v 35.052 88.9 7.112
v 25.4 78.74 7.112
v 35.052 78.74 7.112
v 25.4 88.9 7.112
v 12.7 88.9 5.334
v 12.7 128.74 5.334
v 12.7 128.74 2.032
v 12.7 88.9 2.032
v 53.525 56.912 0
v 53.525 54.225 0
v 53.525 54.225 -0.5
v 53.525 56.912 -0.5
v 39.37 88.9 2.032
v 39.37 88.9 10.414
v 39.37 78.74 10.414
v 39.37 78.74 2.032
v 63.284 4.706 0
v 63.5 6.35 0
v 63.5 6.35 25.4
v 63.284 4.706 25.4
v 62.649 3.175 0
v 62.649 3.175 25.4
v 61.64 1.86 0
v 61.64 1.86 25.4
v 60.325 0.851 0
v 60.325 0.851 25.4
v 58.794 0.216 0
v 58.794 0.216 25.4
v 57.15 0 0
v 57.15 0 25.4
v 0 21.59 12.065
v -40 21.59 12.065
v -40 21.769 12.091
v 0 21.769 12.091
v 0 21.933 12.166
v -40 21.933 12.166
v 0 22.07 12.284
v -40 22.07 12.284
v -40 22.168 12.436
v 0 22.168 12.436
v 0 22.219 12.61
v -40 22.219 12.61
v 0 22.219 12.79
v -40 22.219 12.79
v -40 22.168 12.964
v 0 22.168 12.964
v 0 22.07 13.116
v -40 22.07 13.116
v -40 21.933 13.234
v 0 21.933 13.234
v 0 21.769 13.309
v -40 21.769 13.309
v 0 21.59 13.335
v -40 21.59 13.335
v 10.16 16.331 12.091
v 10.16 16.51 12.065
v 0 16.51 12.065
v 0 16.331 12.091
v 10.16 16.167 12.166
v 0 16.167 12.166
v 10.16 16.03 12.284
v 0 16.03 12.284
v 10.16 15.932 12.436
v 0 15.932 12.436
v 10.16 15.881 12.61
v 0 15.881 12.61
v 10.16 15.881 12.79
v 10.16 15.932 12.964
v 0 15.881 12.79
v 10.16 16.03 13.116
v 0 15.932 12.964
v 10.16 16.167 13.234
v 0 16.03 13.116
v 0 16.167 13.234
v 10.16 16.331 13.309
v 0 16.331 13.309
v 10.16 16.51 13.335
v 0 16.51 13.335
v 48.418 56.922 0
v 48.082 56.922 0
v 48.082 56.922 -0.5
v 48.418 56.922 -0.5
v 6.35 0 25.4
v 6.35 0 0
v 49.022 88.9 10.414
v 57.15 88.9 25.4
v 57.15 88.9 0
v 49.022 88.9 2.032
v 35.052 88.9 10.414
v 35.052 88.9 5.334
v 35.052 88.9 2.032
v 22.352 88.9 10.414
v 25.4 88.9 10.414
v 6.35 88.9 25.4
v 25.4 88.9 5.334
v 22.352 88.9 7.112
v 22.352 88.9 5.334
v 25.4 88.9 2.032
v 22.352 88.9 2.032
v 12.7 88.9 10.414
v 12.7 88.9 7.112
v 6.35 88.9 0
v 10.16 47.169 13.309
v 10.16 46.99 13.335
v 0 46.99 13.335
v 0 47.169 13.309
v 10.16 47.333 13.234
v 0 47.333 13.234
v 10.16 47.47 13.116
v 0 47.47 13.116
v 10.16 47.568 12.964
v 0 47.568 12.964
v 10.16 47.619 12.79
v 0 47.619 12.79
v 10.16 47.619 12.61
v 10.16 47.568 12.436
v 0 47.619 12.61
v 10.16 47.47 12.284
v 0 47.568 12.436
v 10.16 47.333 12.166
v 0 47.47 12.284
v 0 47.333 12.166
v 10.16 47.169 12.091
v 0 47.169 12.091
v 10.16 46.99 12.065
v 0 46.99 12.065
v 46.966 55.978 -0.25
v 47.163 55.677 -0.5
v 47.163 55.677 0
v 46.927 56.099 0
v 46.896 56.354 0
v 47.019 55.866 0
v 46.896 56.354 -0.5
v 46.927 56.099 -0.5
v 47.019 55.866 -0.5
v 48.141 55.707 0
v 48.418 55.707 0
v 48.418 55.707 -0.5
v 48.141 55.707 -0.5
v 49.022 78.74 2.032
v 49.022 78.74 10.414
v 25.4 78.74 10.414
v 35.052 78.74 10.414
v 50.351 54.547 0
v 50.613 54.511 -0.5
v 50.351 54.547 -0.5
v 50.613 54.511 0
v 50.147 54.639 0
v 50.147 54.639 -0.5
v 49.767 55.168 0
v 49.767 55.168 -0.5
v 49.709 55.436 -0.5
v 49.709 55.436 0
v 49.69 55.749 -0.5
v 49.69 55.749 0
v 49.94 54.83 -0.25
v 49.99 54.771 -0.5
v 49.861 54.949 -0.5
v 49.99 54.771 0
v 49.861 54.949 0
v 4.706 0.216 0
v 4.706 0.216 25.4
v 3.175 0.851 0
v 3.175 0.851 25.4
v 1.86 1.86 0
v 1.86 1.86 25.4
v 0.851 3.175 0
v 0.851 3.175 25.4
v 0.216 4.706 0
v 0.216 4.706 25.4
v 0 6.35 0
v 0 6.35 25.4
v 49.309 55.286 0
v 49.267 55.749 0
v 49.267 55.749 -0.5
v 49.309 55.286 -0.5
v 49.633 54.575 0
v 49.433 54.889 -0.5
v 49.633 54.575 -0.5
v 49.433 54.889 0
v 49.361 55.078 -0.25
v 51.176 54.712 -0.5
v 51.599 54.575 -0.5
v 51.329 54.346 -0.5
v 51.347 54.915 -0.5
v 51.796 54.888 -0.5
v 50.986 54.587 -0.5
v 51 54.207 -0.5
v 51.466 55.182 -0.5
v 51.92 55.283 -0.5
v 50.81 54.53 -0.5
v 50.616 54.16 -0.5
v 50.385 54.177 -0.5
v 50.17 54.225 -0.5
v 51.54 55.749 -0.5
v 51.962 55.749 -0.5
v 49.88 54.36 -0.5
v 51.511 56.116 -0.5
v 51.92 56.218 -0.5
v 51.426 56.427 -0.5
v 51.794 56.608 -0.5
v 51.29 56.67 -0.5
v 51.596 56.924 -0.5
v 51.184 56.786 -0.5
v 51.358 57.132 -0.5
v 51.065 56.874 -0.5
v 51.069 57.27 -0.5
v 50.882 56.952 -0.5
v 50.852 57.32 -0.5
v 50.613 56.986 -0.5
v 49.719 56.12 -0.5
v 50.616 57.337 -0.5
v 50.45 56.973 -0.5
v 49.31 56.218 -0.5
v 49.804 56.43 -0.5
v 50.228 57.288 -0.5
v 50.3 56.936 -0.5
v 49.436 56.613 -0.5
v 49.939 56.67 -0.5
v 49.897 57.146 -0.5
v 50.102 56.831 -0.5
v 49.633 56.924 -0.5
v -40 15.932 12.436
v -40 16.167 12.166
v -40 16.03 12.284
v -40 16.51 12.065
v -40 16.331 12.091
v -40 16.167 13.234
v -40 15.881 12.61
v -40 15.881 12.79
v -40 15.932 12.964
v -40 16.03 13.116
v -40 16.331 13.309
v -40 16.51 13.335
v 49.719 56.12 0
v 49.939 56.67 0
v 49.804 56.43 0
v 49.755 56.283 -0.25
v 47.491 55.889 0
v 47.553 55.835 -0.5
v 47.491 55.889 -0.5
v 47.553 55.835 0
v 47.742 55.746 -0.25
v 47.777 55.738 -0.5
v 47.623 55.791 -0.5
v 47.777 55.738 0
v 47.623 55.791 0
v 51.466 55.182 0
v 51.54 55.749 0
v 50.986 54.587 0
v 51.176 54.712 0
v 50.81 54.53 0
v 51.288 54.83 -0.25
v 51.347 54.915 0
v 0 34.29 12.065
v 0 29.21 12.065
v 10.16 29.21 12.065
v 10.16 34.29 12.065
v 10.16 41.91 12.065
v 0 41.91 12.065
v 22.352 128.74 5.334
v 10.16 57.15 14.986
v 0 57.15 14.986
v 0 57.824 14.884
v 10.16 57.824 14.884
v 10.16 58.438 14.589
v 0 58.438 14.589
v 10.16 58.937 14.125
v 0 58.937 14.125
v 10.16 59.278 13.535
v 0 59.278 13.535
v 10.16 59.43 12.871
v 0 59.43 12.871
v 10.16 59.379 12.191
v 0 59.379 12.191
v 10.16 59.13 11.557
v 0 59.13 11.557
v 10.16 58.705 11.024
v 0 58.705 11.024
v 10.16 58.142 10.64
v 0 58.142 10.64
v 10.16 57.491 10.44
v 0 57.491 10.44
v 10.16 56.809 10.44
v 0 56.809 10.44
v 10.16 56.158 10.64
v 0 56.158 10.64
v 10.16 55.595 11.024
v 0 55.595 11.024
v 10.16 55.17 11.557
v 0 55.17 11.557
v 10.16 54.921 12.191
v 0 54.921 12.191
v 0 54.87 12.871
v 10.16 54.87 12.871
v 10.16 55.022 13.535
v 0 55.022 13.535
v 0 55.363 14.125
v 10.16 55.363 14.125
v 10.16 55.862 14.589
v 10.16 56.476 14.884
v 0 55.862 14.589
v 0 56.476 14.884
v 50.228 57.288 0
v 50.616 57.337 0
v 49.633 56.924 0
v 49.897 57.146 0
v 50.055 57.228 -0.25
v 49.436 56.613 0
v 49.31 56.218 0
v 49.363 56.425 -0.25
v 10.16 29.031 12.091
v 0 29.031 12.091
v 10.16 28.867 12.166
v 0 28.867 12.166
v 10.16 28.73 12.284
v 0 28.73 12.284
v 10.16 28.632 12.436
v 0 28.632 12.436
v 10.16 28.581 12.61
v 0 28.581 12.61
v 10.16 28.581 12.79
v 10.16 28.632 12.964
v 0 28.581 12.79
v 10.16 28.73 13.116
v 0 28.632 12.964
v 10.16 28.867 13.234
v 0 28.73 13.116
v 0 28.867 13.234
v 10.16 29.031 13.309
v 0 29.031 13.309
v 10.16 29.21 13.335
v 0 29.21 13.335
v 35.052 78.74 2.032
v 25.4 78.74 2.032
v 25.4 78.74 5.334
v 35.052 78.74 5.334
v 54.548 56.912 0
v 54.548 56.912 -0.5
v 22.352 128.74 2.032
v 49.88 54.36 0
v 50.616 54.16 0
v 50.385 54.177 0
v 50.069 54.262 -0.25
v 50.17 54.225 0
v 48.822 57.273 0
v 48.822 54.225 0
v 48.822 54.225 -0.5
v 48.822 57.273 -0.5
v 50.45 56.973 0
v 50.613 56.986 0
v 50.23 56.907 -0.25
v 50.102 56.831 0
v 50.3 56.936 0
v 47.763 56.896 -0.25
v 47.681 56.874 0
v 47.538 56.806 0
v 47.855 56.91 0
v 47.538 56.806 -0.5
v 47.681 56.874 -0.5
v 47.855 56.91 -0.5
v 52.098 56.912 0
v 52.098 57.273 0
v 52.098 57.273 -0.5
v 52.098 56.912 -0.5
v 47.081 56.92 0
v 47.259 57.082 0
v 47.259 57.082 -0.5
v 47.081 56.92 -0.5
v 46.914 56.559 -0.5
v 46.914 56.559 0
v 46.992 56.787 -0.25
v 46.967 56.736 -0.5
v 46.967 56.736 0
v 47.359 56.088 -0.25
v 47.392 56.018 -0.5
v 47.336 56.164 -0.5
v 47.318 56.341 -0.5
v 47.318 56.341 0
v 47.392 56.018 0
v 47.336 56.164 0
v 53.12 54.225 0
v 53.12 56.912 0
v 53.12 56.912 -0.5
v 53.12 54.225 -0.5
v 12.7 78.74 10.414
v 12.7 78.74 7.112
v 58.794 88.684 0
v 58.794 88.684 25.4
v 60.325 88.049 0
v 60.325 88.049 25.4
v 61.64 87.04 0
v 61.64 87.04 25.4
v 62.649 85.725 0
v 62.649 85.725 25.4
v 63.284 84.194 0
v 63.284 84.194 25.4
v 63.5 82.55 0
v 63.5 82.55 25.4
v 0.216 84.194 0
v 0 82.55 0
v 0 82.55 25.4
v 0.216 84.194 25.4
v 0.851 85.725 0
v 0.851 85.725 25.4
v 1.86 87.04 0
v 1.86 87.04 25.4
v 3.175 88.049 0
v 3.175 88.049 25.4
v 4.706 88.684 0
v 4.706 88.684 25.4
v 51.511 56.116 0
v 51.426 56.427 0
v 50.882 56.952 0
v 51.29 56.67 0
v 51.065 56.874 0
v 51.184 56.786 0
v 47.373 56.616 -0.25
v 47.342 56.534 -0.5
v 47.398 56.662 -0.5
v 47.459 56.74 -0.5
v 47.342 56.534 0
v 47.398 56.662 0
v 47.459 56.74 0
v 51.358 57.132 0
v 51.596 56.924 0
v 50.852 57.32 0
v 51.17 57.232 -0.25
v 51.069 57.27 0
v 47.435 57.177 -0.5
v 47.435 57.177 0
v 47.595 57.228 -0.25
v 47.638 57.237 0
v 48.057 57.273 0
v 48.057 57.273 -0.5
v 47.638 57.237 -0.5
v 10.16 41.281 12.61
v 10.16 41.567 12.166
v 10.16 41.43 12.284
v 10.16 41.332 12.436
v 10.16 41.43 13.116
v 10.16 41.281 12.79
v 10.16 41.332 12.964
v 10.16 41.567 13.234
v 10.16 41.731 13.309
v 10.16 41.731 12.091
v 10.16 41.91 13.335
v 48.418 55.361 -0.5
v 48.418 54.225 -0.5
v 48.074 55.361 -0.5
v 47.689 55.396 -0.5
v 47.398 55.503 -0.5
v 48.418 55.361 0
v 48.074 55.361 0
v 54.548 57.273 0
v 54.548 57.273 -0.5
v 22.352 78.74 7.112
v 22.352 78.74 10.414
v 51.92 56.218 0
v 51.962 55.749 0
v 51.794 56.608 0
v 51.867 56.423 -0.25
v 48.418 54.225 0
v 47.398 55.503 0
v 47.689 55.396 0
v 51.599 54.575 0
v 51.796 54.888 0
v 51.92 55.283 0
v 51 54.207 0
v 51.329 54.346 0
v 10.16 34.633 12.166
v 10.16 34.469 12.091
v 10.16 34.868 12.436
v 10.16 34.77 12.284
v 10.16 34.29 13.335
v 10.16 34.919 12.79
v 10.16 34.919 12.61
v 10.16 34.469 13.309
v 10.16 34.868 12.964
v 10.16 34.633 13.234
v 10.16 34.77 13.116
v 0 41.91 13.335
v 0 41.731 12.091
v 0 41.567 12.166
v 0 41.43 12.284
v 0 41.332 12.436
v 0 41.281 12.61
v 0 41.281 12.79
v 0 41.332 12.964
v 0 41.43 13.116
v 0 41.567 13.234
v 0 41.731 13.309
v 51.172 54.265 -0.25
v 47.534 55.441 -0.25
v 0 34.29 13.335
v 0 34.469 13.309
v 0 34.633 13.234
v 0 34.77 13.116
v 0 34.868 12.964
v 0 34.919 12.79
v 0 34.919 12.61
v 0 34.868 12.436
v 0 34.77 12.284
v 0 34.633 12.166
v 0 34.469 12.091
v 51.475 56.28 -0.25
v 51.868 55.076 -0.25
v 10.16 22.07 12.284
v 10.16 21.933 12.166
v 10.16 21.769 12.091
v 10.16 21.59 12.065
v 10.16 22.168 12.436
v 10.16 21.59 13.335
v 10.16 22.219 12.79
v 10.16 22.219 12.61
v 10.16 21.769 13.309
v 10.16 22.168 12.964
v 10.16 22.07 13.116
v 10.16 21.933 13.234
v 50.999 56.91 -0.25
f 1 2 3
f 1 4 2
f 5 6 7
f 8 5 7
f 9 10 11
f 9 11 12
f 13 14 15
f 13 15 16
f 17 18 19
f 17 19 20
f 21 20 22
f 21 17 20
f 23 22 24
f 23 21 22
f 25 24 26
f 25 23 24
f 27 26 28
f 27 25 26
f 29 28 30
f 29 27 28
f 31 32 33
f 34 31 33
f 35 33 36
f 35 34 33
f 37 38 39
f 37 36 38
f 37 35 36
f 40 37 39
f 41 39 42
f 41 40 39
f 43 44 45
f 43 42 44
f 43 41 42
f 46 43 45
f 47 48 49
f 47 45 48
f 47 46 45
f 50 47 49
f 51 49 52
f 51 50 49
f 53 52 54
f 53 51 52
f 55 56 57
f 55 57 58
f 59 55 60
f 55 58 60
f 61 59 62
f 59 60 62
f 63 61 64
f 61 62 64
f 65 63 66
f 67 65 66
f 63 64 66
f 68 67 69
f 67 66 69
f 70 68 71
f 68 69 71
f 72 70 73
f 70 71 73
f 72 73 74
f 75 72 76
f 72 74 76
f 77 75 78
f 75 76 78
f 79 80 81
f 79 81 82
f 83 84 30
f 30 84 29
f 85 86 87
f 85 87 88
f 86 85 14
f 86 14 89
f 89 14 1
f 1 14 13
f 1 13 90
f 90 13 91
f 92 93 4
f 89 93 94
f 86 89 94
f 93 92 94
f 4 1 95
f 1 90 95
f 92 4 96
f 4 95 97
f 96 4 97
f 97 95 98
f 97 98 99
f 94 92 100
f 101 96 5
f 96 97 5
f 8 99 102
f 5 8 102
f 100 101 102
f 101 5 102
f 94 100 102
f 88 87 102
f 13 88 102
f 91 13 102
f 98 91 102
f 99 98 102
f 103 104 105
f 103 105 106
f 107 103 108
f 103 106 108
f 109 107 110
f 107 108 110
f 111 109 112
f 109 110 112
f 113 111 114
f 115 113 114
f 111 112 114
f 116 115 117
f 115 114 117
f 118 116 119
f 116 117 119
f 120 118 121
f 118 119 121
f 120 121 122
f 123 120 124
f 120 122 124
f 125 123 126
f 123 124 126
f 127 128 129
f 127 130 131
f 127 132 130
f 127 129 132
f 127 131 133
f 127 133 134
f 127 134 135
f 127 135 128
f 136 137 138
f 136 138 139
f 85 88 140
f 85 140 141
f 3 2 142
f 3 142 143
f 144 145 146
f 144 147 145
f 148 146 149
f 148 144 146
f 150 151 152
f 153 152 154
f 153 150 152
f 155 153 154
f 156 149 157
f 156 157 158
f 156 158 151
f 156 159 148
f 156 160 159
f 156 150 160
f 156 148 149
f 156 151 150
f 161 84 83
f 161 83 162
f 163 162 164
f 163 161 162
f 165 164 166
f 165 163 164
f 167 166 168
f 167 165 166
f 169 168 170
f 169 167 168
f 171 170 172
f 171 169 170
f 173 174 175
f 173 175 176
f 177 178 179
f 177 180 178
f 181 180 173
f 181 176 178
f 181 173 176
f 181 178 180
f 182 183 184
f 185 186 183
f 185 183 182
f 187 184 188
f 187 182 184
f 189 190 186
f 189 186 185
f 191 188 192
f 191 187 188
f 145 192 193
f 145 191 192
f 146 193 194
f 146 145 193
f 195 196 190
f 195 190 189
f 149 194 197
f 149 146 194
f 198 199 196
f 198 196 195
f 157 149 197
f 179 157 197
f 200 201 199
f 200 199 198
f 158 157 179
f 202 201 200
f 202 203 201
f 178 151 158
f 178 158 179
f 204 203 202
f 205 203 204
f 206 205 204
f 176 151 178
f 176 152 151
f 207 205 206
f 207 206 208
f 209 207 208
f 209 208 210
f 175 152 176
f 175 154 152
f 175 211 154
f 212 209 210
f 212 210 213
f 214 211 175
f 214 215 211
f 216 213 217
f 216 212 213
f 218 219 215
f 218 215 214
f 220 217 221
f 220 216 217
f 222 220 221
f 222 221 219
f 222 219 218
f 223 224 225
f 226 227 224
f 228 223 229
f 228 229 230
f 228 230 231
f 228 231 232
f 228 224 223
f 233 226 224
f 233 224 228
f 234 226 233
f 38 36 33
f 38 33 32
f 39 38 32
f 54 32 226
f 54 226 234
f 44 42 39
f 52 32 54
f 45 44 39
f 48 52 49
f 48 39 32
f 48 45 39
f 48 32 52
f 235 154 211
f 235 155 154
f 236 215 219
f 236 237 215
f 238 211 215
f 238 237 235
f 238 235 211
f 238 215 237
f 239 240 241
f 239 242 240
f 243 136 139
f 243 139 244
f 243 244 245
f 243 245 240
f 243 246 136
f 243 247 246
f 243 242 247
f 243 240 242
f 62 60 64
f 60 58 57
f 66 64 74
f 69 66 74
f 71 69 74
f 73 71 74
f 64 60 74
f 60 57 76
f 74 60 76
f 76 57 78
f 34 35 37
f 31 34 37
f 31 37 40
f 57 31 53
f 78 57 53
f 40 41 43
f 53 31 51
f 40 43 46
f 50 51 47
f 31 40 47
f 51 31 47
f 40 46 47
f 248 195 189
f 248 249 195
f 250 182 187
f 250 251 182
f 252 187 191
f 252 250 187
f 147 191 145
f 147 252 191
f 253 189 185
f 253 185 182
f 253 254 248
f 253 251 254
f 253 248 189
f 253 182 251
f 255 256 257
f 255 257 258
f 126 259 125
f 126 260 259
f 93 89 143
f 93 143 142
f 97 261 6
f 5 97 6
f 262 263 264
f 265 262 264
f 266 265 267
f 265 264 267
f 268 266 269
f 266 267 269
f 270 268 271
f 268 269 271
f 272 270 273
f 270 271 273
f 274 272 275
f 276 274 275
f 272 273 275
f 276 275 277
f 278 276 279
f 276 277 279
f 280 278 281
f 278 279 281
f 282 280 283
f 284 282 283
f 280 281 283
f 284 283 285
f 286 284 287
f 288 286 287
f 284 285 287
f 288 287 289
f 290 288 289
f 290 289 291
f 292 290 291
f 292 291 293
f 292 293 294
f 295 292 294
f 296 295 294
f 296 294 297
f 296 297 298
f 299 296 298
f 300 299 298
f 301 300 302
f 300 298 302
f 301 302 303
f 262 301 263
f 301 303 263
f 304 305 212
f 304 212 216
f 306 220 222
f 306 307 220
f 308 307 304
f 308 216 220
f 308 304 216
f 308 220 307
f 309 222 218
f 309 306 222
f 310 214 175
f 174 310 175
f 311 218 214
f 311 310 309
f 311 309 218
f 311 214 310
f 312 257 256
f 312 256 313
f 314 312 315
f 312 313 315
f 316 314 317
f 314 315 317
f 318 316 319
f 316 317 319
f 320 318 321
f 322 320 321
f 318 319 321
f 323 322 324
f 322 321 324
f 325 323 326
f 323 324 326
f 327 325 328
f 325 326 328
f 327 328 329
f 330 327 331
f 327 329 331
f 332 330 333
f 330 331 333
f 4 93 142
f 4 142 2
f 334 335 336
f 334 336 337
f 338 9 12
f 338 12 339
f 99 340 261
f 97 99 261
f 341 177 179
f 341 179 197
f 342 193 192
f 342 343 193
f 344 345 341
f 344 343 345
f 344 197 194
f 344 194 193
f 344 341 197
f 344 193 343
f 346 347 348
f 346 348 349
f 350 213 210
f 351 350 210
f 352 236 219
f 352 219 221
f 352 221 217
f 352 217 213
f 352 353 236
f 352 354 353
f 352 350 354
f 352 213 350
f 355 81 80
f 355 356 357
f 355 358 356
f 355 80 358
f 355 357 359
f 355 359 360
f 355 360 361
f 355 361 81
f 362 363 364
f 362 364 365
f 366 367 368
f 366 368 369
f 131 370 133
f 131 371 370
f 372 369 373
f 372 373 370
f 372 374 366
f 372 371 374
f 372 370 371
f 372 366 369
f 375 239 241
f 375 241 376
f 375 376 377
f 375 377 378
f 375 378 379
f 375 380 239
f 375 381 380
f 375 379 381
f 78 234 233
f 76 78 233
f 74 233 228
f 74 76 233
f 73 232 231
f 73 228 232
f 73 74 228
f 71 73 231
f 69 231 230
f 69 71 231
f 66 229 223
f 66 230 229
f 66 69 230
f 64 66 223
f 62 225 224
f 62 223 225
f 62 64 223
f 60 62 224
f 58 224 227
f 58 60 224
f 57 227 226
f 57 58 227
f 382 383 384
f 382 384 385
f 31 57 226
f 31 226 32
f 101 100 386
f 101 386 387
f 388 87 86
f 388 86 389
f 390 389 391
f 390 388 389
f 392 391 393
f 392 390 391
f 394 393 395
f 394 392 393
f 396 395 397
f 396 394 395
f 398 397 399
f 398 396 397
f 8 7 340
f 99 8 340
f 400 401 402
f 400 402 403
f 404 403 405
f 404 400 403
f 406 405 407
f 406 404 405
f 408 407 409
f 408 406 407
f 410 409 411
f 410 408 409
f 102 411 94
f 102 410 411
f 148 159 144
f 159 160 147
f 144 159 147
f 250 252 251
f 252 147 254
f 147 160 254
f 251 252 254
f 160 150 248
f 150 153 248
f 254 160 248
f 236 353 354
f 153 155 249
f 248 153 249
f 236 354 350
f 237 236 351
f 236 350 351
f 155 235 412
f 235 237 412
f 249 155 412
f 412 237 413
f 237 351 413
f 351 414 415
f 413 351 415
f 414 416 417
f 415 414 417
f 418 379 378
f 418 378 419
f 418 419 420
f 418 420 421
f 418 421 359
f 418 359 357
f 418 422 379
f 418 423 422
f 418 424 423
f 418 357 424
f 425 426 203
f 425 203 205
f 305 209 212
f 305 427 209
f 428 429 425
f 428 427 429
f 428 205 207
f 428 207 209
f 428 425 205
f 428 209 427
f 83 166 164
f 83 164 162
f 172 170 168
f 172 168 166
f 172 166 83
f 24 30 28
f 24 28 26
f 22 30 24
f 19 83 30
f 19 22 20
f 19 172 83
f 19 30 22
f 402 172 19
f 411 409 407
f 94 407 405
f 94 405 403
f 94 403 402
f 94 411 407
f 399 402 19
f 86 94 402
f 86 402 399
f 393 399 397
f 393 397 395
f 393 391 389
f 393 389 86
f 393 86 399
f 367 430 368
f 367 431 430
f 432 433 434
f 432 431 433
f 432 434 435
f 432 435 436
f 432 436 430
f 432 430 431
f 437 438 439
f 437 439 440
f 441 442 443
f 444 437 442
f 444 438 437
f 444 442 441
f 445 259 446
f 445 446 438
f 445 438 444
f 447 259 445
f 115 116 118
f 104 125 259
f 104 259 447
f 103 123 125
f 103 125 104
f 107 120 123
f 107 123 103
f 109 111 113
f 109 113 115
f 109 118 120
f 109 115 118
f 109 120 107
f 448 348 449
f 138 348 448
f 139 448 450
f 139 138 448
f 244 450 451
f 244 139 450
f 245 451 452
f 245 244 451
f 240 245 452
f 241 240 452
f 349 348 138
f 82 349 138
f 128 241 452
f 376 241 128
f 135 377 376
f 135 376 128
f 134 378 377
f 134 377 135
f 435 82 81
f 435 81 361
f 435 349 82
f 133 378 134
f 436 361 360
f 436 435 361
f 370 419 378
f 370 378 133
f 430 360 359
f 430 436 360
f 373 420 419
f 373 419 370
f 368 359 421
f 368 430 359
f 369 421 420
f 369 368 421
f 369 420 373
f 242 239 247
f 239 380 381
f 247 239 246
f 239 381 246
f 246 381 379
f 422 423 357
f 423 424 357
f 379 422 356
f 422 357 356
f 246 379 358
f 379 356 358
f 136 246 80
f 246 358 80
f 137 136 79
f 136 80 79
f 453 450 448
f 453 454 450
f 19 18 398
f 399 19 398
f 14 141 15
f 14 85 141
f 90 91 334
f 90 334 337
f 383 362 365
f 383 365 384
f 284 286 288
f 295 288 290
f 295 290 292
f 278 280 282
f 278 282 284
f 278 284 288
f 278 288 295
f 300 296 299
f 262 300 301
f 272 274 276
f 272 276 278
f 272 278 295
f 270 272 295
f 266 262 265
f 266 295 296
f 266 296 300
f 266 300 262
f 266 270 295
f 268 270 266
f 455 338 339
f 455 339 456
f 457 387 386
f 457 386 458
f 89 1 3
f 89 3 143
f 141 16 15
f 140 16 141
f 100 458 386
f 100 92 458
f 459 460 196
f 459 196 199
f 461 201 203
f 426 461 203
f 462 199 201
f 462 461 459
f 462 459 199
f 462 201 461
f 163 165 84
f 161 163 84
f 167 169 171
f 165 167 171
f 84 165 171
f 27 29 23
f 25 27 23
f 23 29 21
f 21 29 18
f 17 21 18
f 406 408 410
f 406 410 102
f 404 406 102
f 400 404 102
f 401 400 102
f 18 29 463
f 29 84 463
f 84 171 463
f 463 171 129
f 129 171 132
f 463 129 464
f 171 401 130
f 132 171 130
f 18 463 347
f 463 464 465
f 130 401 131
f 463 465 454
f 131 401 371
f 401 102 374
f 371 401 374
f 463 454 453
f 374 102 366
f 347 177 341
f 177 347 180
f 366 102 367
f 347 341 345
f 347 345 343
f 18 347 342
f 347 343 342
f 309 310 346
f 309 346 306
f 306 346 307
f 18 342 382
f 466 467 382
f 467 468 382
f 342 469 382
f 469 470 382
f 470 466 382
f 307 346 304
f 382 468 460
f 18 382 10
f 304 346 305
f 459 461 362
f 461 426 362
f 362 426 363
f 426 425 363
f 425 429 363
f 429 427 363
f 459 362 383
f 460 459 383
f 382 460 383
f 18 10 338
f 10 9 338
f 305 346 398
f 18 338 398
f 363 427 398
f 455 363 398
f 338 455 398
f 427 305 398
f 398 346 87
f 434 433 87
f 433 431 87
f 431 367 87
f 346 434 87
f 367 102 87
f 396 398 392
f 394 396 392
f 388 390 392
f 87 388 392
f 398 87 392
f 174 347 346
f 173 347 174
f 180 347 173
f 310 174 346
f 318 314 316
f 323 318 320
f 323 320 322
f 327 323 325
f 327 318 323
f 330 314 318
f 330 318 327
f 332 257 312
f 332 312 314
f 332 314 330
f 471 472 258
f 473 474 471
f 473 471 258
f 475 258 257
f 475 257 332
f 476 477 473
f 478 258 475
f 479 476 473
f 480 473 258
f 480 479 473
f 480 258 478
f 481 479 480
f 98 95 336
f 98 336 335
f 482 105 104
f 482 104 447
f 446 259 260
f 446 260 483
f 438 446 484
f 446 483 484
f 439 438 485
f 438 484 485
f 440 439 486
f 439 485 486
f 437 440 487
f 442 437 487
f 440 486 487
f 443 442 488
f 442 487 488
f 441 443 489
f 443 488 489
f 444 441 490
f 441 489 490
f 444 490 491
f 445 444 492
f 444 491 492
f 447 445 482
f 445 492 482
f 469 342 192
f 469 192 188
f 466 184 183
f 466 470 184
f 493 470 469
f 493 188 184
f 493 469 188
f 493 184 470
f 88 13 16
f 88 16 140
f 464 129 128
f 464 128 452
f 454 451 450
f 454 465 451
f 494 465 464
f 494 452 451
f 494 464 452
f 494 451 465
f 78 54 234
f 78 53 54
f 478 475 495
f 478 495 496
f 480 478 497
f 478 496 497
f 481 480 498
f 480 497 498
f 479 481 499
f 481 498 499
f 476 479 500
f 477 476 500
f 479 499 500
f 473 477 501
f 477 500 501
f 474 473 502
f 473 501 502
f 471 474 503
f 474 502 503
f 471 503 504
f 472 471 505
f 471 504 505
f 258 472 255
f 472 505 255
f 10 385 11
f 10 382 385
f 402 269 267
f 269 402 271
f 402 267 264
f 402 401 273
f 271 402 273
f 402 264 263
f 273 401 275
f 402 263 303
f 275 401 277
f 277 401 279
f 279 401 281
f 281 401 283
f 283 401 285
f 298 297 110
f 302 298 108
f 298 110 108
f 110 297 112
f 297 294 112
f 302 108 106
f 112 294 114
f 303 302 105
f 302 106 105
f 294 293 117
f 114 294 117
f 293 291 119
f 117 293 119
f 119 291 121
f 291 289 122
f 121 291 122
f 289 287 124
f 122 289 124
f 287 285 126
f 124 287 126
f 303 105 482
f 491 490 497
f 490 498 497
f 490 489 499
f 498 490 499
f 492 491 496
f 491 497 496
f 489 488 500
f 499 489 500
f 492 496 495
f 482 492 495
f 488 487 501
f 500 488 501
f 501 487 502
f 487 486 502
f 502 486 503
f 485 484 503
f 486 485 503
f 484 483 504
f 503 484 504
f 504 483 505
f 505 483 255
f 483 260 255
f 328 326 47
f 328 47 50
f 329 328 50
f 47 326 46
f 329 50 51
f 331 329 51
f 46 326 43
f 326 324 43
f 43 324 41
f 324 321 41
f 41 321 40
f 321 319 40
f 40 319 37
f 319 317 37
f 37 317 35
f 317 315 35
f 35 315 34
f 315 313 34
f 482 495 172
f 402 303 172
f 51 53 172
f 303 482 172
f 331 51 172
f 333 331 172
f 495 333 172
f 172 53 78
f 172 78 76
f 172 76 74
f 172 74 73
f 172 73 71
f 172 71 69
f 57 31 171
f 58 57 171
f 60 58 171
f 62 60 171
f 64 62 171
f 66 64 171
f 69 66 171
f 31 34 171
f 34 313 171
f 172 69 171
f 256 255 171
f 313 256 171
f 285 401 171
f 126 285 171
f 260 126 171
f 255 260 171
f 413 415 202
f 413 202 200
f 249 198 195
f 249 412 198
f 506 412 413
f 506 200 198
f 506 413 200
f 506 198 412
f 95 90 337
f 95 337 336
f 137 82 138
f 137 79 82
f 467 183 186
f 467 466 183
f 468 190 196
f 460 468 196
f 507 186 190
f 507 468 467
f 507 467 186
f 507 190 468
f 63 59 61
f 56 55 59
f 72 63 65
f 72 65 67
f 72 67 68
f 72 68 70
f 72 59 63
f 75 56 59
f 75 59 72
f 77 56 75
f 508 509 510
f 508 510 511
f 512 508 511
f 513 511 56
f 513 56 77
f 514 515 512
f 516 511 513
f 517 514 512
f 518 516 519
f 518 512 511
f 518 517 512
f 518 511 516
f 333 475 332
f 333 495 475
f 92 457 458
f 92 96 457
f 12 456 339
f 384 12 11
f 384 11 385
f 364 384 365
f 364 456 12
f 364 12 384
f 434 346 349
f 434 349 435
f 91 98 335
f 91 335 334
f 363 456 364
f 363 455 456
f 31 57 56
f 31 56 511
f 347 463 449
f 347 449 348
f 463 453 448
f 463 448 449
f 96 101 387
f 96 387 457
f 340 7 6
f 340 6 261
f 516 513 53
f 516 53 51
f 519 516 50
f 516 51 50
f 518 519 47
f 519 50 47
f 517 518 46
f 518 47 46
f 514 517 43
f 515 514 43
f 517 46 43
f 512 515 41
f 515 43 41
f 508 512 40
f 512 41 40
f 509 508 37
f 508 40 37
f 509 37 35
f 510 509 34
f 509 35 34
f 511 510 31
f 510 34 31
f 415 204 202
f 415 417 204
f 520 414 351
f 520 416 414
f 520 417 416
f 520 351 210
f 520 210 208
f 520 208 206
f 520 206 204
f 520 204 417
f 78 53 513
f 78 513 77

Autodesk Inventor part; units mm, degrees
ref_plane "YZ Plane" through (0, 0, 0) normal (1, 0, 0) x (0, 1, 0)
ref_plane "XZ Plane" through (0, 0, 0) normal (0, 1, 0) x (-1, 0, 0)
ref_plane "XY Plane" through (0, 0, 0) normal (0, 0, 1) x (1, 0, 0)
sketch "Sketch1" plane through (0, 0, 0) normal (0, 0, 1) x (1, 0, 0)
  line L0 (6.35, 0) -> (57.15, 0)
  line L1 (63.5, 6.35) -> (63.5, 82.55)
  line L2 (57.15, 88.9) -> (6.35, 88.9)
  line L3 (0, 82.55) -> (0, 6.35)
  arc A0 (6.35, 88.9) -> (0, 82.55) centre (6.35, 82.55) ccw
  arc A1 (63.5, 82.55) -> (57.15, 88.9) centre (57.15, 82.55) ccw
  arc A2 (57.15, 0) -> (63.5, 6.35) centre (57.15, 6.35) ccw
  arc A3 (0, 6.35) -> (6.35, 0) centre (6.35, 6.35) ccw
  point P0 (0, 0)
  point P1 (63.5, 88.9)
  point P2 (63.5, 0)
  point P3 (0, 88.9)
  dimension "d0" = 88.9
  dimension "d1" = 63.5
  dimension "d2" = 6.35
extrude "Extrusion1" add sketch "Sketch1" along normal blind 25.4
sketch "Sketch2" plane through (6.35, 88.9, 0) normal (0, 1, 0) x (1, 0, 0)
  line L0 (6.35, -2.032) -> (16.002, -2.032)
  line L1 (16.002, -2.032) -> (16.002, -5.334)
  line L2 (16.002, -5.334) -> (6.35, -5.334)
  line L3 (6.35, -5.334) -> (6.35, -2.032)
  line L4 (0, 0) -> (0, -25.4) projected
  line L5 (50.8, 0) -> (0, 0) projected
  line L6 (28.702, -5.334) -> (19.05, -5.334)
  line L7 (19.05, -2.032) -> (28.702, -2.032)
  line L8 (28.702, -2.032) -> (28.702, -5.334)
  line L9 (19.05, -5.334) -> (19.05, -2.032)
  line L10 (16.002, -10.414) -> (6.35, -10.414)
  line L11 (6.35, -7.112) -> (16.002, -7.112)
  line L12 (16.002, -7.112) -> (16.002, -10.414)
  line L13 (6.35, -10.414) -> (6.35, -7.112)
  line L14 (28.702, -10.414) -> (19.05, -10.414)
  line L15 (19.05, -7.112) -> (28.702, -7.112)
  line L16 (28.702, -7.112) -> (28.702, -10.414)
  line L17 (19.05, -10.414) -> (19.05, -7.112)
  line L18 (33.02, -2.032) -> (42.672, -2.032)
  line L19 (42.672, -2.032) -> (42.672, -10.414)
  line L20 (42.672, -10.414) -> (33.02, -10.414)
  line L21 (33.02, -10.414) -> (33.02, -2.032)
  point P0 (-6.35, 0)
  point P1 (6.35, -3.683)
  point P2 (19.05, -3.683)
  point P3 (6.35, -8.763)
  point P4 (19.05, -8.763)
  point P5 (37.846, -2.032)
  dimension "d5" = 6.35
  dimension "d6" = 9.652
  dimension "d7" = 3.302
  dimension "d8" = 2.032
  dimension "d11" = 12.7
  dimension "d14" = 5.08
  dimension "d17" = 8.382
  dimension "d18" = 9.652
  dimension "d19" = 4.318
  dimension "d20" = 0
extrude "Extrusion2" cut sketch "Sketch2" against normal blind 10.16
sketch "Sketch3" plane through (0, 6.35, 0) normal (-1, 0, 0) x (0, 0, 1)
  line L0 (12.7, 10.16) -> (12.7, 15.24) construction
  line L1 (12.065, 10.16) -> (12.065, 15.24)
  line L2 (13.335, 15.24) -> (13.335, 10.16)
  arc A0 (12.065, 10.16) -> (13.335, 10.16) centre (12.7, 10.16) ccw
  arc A1 (13.335, 15.24) -> (12.065, 15.24) centre (12.7, 15.24) ccw
  line L3 (25.4, 76.2) -> (25.4, 0) projected
  line L4 (0, 0) -> (25.4, 0) projected
  line L5 (13.335, 27.94) -> (13.335, 22.86)
  arc A2 (12.065, 22.86) -> (13.335, 22.86) centre (12.7, 22.86) ccw
  line L6 (12.065, 22.86) -> (12.065, 27.94)
  arc A3 (13.335, 27.94) -> (12.065, 27.94) centre (12.7, 27.94) ccw
  line L7 (13.335, 40.64) -> (13.335, 35.56)
  arc A4 (12.065, 35.56) -> (13.335, 35.56) centre (12.7, 35.56) ccw
  line L8 (12.065, 35.56) -> (12.065, 40.64)
  arc A5 (13.335, 40.64) -> (12.065, 40.64) centre (12.7, 40.64) ccw
  circle A6 centre (12.7, 50.8) radius 2.286
  line L9 (0, 76.2) -> (25.4, 76.2) projected
  point P0 (0, -6.35)
  point P1 (12.7, 12.7)
  point P2 (12.7, 76.2)
  dimension "d23" = 5.08
  dimension "d24" = 0.635
  dimension "d25" = 12.7
  dimension "d26" = 12.7
  dimension "d29" = 12.7
  dimension "d34" = 4.572
  dimension "d35" = 12.7
  dimension "d36" = 25.4
extrude "Extrusion3" cut sketch "Sketch3" against normal blind 10.16
sketch "Sketch4" plane through (6.35, 78.74, 0) normal (0, 1, 0) x (1, 0, 0)
  point P0 (-6.35, 0)
sketch "Sketch5" plane through (6.35, 78.74, 0) normal (0, 1, 0) x (1, 0, 0)
  line L0 (16.002, -5.334) -> (6.35, -5.334) projected
  line L1 (6.35, -5.334) -> (6.35, -2.032) projected
  line L2 (6.35, -2.032) -> (16.002, -2.032) projected
  line L3 (16.002, -2.032) -> (16.002, -5.334) projected
  point P0 (-6.35, 0)
extrude "Extrusion4" add sketch "Sketch5" along normal blind 50
sketch "Sketch6" plane through (0, 6.35, 0) normal (-1, 0, 0) x (0, 0, 1)
  arc A0 (12.065, 10.16) -> (13.335, 10.16) centre (12.7, 10.16) ccw projected
  line L0 (13.335, 15.24) -> (13.335, 10.16) projected
  line L1 (12.065, 10.16) -> (12.065, 15.24) projected
  arc A1 (13.335, 15.24) -> (12.065, 15.24) centre (12.7, 15.24) ccw projected
  arc A2 (12.065, 22.86) -> (13.335, 22.86) centre (12.7, 22.86) ccw projected
  line L2 (13.335, 27.94) -> (13.335, 22.86) projected
  line L3 (12.065, 22.86) -> (12.065, 27.94) projected
  arc A3 (13.335, 27.94) -> (12.065, 27.94) centre (12.7, 27.94) ccw projected
  point P0 (0, -6.35)
extrude "Extrusion5" add sketch "Sketch6" along normal blind 40 contours L1 A1 L0 A0
sketch "Sketch7" plane through (0, 0, 0) normal (0, 0, -1) x (-1, 0, 0)
  line L0 (-54.5456, 57.3368) -> (-7.6923, 57.3368) construction
  line L1 (-7.6923, 57.3368) -> (-7.6923, 33.9102) construction
  line L2 (-7.6923, 33.9102) -> (-54.5456, 33.9102) construction
  line L3 (-54.5456, 33.9102) -> (-54.5456, 57.3368) construction
  line L4 (-53.5254, 54.2246) -> (-53.5254, 56.912)
  line L5 (-53.5254, 56.912) -> (-54.548, 56.912)
  line L6 (-54.548, 56.912) -> (-54.548, 57.2726)
  line L7 (-54.548, 57.2726) -> (-52.0978, 57.2726)
  line L8 (-52.0978, 57.2726) -> (-52.0978, 56.912)
  line L9 (-52.0978, 56.912) -> (-53.1204, 56.912)
  line L10 (-53.1204, 56.912) -> (-53.1204, 54.2246)
  line L11 (-53.1204, 54.2246) -> (-53.5254, 54.2246)
  spline S0 degree 2 poles (-49.6327, 56.9243) (-49.4598, 56.7218) (-49.2671, 56.129) (-49.2671, 55.7486) knots 0 0 0 1 2 2 2
  spline S1 degree 2 poles (-49.2671, 55.7486) (-49.2671, 55.3781) (-49.4549, 54.7779) (-49.6327, 54.5753) knots 0 0 0 1 2 2 2
  spline S2 degree 2 poles (-49.6327, 54.5753) (-49.8204, 54.3629) (-50.3169, 54.1604) (-50.6158, 54.1604) knots 0 0 0 1 2 2 2
  spline S3 degree 2 poles (-50.6158, 54.1604) (-50.9245, 54.1604) (-51.4185, 54.3703) (-51.5988, 54.5753) knots 0 0 0 1 2 2 2
  spline S4 degree 2 poles (-51.5988, 54.5753) (-51.7742, 54.7779) (-51.9619, 55.3731) (-51.9619, 55.7486) knots 0 0 0 1 2 2 2
  spline S5 degree 2 poles (-51.9619, 55.7486) (-51.9619, 56.1314) (-51.7717, 56.7144) (-51.5964, 56.9243) knots 0 0 0 1 2 2 2
  spline S6 degree 2 poles (-51.5964, 56.9243) (-51.4185, 57.1269) (-50.9221, 57.3368) (-50.6158, 57.3368) knots 0 0 0 1 2 2 2
  spline S7 degree 2 poles (-50.6158, 57.3368) (-50.3045, 57.3368) (-49.8056, 57.1194) (-49.6327, 56.9243) knots 0 0 0 1 2 2 2
  spline S8 degree 2 poles (-49.6895, 55.7486) (-49.6895, 56.0499) (-49.8204, 56.5168) (-49.939, 56.6699) knots 0 0 0 1 2 2 2
  spline S9 degree 2 poles (-49.939, 56.6699) (-50.06, 56.828) (-50.4009, 56.9861) (-50.6133, 56.9861) knots 0 0 0 1 2 2 2
  spline S10 degree 2 poles (-50.6133, 56.9861) (-50.8331, 56.9861) (-51.1641, 56.8329) (-51.2901, 56.6699) knots 0 0 0 1 2 2 2
  spline S11 degree 2 poles (-51.2901, 56.6699) (-51.4111, 56.5143) (-51.5396, 56.045) (-51.5396, 55.7486) knots 0 0 0 1 2 2 2
  spline S12 degree 2 poles (-51.5396, 55.7486) (-51.5396, 55.1484) (-51.0357, 54.5111) (-50.6133, 54.5111) knots 0 0 0 1 2 2 2
  spline S13 degree 2 poles (-50.6133, 54.5111) (-50.1909, 54.5111) (-49.6895, 55.1484) (-49.6895, 55.7486) knots 0 0 0 1 2 2 2
  spline S14 degree 2 poles (-46.8959, 56.3537) (-46.8959, 56.1561) (-47.0367, 55.8005) (-47.1627, 55.677) knots 0 0 0 1 2 2 2
  spline S15 degree 2 poles (-47.1627, 55.677) (-47.3208, 55.5213) (-47.7481, 55.3608) (-48.0741, 55.3608) knots 0 0 0 1 2 2 2
  line L12 (-48.0741, 55.3608) -> (-48.4175, 55.3608)
  line L13 (-48.4175, 55.3608) -> (-48.4175, 54.2246)
  line L14 (-48.4175, 54.2246) -> (-48.8225, 54.2246)
  line L15 (-48.8225, 54.2246) -> (-48.8225, 57.2726)
  line L16 (-48.8225, 57.2726) -> (-48.0568, 57.2726)
  spline S16 degree 2 poles (-48.0568, 57.2726) (-47.7851, 57.2726) (-47.4047, 57.1837) (-47.259, 57.0824) knots 0 0 0 1 2 2 2
  spline S17 degree 2 poles (-47.259, 57.0824) (-47.0886, 56.9663) (-46.8959, 56.6082) (-46.8959, 56.3537) knots 0 0 0 1 2 2 2
  spline S18 degree 2 poles (-47.3183, 56.3414) (-47.3183, 56.4995) (-47.427, 56.7317) (-47.5381, 56.8058) knots 0 0 0 1 2 2 2
  spline S19 degree 2 poles (-47.5381, 56.8058) (-47.6345, 56.87) (-47.8913, 56.9218) (-48.0815, 56.9218) knots 0 0 0 1 2 2 2
  line L17 (-48.0815, 56.9218) -> (-48.4175, 56.9218)
  line L18 (-48.4175, 56.9218) -> (-48.4175, 55.7066)
  line L19 (-48.4175, 55.7066) -> (-48.1408, 55.7066)
  spline S20 degree 2 poles (-48.1408, 55.7066) (-47.8938, 55.7066) (-47.59, 55.7856) (-47.4912, 55.8894) knots 0 0 0 1 2 2 2
  spline S21 degree 2 poles (-47.4912, 55.8894) (-47.3998, 55.9808) (-47.3183, 56.1957) (-47.3183, 56.3414) knots 0 0 0 1 2 2 2
  point P0 (0, 0)
  dimension "d0" = 88.9
  dimension "d1" = 63.5
  dimension "d2" = 6.35
extrude "Extrusion6" add sketch "Sketch7" along normal blind 0.5
properties part number "RaspberryPi"
